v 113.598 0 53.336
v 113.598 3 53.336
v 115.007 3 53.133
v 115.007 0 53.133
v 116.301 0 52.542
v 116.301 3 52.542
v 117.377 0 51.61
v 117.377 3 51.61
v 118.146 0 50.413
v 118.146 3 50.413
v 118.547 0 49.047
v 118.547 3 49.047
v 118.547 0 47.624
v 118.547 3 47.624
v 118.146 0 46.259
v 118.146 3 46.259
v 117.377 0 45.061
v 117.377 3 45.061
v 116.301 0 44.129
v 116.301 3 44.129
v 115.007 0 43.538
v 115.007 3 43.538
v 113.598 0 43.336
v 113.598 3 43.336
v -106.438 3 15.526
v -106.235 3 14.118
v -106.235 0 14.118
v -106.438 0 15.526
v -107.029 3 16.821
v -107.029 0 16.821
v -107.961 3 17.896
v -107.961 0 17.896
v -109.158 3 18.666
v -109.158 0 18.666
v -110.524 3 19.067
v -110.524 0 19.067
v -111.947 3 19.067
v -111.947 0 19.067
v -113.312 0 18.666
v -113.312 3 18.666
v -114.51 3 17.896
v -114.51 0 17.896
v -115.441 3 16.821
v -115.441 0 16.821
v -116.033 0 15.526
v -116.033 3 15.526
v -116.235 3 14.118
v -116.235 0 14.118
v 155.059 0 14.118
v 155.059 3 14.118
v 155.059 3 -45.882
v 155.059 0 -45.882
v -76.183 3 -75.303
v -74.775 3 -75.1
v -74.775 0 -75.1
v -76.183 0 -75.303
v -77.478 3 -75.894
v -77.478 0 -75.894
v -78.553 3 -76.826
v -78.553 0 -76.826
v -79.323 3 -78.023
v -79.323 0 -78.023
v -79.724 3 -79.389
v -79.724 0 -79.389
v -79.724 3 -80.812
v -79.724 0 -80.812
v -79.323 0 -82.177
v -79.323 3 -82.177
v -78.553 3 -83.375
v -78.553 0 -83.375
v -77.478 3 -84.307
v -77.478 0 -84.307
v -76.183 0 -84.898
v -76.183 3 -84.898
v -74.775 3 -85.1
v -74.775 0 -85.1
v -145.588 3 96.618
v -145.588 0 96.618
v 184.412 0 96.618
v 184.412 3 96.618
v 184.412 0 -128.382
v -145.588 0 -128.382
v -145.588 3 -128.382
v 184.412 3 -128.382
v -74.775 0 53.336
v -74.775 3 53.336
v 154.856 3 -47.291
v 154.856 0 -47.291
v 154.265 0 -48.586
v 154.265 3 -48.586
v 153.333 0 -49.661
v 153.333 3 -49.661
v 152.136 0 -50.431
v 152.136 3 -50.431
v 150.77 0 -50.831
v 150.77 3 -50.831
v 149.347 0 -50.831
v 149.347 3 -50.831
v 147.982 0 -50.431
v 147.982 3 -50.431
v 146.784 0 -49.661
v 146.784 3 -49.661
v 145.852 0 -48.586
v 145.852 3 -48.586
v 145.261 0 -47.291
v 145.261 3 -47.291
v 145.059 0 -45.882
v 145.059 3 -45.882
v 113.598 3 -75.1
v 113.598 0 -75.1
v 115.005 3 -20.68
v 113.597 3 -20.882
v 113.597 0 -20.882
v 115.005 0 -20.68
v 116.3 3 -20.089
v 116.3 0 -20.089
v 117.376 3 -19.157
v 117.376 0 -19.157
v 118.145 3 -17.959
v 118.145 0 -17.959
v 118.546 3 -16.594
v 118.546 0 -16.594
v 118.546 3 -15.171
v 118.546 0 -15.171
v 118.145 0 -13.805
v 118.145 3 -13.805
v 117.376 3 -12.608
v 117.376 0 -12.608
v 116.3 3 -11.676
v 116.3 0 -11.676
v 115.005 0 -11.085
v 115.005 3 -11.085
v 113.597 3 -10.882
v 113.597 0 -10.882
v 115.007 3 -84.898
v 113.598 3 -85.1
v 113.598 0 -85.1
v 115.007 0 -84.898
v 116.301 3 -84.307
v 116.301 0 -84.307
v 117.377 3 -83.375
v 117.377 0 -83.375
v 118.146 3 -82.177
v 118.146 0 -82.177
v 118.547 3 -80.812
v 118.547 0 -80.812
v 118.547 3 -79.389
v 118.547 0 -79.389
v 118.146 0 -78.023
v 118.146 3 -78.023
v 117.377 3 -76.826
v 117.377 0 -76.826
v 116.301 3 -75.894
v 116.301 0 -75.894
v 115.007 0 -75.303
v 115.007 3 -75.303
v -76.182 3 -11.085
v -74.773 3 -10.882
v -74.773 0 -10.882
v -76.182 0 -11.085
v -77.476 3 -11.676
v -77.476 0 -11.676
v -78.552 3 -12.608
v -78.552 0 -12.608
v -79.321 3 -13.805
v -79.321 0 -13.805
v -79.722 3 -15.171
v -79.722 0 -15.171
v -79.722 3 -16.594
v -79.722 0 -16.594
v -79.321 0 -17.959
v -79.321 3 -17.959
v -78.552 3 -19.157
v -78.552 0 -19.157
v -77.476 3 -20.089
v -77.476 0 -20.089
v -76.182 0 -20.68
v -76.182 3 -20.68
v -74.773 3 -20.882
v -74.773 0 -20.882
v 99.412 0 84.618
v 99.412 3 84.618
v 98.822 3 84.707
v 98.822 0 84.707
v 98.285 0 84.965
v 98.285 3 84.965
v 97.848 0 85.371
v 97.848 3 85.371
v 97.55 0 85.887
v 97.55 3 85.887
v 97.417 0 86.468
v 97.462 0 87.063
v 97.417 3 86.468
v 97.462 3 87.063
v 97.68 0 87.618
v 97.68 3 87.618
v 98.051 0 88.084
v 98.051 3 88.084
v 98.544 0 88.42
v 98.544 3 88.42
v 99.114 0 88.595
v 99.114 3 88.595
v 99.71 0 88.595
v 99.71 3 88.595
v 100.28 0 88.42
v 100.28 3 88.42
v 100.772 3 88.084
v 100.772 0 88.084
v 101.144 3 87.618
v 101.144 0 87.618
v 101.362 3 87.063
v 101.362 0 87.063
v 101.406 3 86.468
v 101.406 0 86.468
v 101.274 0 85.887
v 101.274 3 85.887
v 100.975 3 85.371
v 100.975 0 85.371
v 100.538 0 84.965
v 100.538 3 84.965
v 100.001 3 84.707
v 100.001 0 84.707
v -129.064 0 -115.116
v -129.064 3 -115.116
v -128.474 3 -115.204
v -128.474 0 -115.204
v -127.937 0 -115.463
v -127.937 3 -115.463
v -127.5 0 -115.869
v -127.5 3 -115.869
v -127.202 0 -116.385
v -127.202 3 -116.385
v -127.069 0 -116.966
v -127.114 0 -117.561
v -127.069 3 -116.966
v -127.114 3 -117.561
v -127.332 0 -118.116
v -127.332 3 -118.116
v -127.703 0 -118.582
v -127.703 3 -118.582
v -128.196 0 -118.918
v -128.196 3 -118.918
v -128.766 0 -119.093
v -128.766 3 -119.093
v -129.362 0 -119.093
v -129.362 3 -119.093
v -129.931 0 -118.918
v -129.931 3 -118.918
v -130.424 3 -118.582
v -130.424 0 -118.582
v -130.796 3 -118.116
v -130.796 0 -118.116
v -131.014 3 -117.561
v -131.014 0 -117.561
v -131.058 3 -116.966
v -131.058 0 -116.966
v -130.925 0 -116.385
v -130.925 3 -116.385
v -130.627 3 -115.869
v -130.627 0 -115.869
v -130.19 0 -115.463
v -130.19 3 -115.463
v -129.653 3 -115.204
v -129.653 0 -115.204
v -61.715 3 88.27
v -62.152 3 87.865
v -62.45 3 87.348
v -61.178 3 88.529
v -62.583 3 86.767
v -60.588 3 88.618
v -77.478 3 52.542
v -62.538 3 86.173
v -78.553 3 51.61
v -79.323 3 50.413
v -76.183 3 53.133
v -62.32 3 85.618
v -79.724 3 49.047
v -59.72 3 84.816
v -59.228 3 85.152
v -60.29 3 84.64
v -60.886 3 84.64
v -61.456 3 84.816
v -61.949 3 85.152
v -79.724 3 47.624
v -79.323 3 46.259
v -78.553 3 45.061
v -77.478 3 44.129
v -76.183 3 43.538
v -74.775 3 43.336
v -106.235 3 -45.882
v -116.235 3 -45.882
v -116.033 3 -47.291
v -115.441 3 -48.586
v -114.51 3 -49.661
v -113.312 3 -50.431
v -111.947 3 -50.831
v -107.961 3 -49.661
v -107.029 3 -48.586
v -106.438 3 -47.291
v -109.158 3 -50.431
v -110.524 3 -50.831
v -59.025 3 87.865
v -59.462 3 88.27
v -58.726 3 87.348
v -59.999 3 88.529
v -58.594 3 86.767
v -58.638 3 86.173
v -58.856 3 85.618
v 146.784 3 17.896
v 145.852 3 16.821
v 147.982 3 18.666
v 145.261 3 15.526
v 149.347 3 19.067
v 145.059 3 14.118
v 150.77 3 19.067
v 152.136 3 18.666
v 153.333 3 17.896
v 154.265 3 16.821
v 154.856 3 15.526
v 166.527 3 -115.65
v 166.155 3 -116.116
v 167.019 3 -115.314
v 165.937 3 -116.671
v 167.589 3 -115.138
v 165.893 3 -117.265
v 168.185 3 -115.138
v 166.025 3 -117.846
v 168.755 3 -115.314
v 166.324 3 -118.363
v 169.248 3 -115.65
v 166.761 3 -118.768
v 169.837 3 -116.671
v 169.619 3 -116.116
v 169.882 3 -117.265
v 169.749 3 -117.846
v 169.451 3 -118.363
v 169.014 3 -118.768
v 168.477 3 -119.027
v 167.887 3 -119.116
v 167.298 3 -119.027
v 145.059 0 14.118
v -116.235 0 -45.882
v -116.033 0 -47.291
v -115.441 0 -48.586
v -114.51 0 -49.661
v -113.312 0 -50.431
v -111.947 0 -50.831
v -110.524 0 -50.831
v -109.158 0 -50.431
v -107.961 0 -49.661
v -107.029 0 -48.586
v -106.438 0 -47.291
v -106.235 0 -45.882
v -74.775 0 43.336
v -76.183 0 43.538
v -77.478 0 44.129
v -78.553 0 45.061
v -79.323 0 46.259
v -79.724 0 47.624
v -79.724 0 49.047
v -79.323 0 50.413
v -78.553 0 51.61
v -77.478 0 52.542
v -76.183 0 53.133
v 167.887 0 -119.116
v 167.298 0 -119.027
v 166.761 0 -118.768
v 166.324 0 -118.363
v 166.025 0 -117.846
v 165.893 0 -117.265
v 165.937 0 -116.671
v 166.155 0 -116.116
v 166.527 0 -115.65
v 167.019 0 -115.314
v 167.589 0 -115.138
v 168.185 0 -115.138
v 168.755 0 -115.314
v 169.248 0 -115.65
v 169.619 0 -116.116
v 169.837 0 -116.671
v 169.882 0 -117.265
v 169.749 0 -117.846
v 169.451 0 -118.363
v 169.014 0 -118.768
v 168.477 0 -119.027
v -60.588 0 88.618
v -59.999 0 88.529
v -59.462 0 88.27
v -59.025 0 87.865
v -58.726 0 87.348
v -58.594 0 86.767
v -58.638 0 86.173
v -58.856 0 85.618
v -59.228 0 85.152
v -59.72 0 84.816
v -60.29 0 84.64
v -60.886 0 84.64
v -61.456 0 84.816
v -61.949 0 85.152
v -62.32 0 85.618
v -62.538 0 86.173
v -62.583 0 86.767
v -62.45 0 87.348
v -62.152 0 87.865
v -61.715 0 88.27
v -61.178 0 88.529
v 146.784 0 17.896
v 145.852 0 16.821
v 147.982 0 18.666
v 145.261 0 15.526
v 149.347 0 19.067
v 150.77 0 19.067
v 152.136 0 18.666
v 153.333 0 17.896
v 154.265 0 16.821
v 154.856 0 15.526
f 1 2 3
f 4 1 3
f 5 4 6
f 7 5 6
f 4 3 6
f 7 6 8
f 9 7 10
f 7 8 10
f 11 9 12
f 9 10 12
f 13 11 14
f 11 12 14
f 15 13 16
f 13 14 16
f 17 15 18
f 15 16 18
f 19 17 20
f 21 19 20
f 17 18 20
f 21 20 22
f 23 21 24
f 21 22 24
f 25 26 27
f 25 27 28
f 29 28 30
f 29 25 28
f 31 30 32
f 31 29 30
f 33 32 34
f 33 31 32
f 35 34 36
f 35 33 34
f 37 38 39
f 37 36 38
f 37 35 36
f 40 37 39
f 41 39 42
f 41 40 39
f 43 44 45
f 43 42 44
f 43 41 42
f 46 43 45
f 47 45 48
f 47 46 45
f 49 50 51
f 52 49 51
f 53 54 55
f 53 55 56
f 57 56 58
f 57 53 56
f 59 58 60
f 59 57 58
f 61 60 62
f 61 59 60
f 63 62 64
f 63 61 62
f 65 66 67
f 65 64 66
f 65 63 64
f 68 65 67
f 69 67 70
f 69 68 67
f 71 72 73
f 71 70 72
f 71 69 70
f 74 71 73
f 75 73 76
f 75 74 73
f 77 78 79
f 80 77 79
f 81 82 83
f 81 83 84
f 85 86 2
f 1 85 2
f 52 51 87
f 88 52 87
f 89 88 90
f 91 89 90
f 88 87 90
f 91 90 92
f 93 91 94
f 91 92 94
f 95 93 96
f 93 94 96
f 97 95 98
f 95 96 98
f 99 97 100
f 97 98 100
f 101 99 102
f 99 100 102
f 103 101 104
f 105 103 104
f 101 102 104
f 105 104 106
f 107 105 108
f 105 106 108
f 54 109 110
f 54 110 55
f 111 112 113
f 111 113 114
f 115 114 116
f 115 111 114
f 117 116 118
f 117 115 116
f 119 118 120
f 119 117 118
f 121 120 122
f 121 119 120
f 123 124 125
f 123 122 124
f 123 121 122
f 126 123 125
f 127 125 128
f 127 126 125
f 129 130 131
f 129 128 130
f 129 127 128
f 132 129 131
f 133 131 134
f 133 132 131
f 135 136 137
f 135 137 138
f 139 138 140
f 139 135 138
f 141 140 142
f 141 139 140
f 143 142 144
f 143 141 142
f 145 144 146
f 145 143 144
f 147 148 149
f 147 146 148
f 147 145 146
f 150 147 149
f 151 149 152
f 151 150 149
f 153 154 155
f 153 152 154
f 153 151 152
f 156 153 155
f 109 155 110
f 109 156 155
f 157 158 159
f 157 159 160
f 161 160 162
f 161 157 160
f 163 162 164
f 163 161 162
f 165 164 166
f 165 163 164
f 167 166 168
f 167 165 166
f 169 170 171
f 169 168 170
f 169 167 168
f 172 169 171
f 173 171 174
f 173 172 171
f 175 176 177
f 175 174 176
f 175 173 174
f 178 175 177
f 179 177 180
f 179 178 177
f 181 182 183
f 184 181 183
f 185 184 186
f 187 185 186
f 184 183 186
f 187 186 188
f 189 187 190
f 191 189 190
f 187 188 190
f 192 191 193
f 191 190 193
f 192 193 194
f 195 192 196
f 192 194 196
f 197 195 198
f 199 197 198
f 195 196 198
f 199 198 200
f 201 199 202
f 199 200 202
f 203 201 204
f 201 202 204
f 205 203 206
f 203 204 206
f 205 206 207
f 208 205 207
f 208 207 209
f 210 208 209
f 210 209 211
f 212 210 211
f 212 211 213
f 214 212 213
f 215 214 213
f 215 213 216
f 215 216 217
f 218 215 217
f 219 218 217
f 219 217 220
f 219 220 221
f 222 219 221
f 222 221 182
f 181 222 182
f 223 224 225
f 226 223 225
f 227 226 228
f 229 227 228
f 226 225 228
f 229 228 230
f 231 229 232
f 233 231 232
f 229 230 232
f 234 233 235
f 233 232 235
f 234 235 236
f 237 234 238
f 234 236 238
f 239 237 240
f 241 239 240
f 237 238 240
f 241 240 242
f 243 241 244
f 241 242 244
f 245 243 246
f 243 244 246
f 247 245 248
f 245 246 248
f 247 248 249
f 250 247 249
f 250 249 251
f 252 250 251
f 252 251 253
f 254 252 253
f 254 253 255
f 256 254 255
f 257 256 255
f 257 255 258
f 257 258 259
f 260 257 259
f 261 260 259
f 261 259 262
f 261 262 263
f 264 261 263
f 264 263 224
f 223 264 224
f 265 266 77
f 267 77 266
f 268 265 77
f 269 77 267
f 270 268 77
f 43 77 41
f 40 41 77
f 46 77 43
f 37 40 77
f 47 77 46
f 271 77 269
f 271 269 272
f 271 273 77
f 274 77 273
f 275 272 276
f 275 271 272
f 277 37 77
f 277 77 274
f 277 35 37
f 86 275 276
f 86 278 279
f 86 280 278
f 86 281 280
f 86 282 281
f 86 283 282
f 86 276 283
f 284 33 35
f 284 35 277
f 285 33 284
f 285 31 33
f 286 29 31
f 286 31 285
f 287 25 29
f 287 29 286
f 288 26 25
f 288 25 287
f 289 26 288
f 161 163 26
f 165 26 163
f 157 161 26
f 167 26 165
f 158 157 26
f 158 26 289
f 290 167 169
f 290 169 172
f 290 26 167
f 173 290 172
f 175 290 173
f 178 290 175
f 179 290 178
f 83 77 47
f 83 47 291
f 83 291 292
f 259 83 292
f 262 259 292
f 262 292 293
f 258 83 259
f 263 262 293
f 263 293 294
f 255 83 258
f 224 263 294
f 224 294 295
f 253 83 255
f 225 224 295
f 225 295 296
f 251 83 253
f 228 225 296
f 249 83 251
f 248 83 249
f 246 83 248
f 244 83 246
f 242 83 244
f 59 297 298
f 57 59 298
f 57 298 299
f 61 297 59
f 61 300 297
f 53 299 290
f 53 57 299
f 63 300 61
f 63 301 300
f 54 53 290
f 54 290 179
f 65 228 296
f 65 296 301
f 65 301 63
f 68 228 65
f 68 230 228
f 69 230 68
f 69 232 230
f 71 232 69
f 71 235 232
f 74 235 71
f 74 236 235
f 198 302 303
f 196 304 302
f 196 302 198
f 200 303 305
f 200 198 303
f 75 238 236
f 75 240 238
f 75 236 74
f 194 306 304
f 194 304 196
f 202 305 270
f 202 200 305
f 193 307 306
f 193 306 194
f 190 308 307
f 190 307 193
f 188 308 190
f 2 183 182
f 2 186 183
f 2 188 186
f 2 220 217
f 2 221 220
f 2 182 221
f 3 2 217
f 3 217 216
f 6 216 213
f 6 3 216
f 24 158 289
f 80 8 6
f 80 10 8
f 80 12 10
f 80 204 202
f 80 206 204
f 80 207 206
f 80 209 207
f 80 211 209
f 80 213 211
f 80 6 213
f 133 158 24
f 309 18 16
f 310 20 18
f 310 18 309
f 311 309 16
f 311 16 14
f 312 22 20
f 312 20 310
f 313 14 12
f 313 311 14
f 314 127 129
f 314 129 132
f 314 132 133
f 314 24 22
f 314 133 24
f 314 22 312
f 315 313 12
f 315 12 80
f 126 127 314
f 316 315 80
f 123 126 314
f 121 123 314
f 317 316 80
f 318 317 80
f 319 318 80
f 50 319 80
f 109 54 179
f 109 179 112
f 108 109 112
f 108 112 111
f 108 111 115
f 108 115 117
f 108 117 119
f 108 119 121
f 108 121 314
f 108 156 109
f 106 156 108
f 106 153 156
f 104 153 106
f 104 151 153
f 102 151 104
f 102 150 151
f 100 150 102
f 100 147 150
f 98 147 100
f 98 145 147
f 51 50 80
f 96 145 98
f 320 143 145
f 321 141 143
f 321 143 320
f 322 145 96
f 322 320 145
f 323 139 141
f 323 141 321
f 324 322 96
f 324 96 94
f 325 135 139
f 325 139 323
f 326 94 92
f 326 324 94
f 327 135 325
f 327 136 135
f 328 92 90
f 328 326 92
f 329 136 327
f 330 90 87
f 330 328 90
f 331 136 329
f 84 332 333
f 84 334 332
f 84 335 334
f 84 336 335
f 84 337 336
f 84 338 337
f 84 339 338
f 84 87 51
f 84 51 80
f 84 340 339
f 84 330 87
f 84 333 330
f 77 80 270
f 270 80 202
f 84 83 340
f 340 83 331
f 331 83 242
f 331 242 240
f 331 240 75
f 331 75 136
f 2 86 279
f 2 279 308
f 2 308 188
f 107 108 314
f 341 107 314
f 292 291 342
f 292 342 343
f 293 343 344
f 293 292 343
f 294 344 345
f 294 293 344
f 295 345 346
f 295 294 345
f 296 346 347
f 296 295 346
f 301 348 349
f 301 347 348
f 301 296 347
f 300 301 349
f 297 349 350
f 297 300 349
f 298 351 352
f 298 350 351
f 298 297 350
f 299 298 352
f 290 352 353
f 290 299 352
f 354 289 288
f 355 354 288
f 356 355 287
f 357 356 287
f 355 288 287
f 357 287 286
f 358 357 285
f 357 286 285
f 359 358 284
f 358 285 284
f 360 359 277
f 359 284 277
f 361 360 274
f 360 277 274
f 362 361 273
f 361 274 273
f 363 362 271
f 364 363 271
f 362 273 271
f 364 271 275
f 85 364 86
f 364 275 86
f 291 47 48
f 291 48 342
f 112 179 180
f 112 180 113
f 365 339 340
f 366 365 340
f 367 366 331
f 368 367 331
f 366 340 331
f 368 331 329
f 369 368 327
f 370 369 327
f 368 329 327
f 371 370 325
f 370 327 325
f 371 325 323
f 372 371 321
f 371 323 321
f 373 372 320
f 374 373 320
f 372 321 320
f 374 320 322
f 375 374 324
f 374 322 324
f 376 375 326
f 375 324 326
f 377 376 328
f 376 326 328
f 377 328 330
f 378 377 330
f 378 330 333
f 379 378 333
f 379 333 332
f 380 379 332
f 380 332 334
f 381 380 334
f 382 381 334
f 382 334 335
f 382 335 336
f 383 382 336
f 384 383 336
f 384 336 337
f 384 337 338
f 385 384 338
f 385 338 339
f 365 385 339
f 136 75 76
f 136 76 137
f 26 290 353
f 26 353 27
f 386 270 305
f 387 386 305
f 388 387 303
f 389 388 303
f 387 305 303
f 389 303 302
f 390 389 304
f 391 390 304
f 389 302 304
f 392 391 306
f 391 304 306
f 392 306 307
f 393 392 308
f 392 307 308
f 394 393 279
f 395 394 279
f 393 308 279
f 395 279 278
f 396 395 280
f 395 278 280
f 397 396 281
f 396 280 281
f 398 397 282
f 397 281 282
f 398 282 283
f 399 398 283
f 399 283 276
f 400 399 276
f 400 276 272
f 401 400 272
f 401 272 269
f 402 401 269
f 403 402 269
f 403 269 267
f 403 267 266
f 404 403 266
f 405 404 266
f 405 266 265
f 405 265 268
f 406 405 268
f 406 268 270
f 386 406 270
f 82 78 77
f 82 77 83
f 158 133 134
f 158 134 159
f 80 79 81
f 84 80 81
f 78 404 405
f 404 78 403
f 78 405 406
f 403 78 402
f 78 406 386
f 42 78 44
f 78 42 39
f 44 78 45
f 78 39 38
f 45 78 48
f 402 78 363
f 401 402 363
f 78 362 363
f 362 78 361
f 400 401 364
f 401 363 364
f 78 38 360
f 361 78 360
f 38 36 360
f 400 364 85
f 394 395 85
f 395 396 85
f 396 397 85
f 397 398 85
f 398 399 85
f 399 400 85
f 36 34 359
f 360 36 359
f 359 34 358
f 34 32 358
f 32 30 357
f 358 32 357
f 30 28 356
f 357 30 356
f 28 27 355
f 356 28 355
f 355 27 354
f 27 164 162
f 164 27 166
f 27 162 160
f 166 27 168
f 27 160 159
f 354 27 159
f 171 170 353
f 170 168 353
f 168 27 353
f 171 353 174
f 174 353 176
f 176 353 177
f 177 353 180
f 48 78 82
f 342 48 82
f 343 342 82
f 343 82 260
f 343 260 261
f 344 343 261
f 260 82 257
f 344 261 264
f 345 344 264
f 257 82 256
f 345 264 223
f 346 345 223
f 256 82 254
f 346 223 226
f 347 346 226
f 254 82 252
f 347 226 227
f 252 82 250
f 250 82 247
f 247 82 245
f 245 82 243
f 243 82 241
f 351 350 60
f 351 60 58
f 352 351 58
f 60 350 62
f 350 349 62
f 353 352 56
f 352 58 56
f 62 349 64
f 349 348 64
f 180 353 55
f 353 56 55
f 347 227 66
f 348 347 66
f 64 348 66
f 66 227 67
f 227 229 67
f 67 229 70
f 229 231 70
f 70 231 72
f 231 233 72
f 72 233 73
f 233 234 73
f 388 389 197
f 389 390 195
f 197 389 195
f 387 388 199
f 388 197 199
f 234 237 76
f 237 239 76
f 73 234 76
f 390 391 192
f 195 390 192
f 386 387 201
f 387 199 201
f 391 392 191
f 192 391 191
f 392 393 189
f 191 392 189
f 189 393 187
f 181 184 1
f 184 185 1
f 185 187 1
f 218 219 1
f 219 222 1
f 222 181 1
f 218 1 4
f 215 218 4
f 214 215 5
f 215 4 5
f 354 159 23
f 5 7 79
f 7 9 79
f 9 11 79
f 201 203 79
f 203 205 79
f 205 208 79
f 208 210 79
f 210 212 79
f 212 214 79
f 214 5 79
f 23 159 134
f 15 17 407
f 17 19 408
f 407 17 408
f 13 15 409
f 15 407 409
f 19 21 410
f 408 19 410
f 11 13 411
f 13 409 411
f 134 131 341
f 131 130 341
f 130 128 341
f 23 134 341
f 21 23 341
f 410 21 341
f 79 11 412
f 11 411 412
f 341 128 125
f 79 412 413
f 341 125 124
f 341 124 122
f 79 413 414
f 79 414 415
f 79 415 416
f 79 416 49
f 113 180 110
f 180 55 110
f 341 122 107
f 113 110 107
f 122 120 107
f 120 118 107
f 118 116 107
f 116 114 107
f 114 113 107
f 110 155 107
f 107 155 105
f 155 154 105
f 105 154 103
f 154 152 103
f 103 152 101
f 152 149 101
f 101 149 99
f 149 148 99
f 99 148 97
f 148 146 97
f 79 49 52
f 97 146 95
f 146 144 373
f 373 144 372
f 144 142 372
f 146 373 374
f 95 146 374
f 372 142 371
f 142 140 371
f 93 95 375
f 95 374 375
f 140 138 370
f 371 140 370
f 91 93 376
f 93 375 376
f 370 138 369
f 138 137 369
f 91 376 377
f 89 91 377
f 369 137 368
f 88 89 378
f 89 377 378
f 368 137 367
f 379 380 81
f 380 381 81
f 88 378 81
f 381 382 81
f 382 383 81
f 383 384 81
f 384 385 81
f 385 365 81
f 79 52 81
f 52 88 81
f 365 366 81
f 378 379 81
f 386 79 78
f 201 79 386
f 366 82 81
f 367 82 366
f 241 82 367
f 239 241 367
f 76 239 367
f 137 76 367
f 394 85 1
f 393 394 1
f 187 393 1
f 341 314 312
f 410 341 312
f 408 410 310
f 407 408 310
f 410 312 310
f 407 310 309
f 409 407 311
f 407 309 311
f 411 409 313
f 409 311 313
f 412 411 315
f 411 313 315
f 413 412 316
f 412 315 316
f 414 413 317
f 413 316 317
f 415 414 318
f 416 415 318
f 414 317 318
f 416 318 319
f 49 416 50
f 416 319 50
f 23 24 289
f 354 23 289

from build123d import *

# Parameters (mm, degrees)
SKETCH_1_W          = 330
SKETCH_1_H          = 225
EXTRUDE_1_DEPTH     = 3
SKETCH_3_R          = 2
CUT_EXTRUDE_1_DEPTH = 225.719219269
CUT_EXTRUDE_2_DEPTH = 225.719219269
CUT_EXTRUDE_3_DEPTH = 225.719219269
CUT_EXTRUDE_4_DEPTH = 225.719219269


with BuildPart() as part:
    # 草图1 → 凸台-拉伸1 (new body)
    with BuildSketch(Plane(origin=(0, 0, 0), x_dir=(1, 0, 0), z_dir=(0, 1, 0))):
        with Locations((19.411764706, 15.882352941)):
            Rectangle(SKETCH_1_W, SKETCH_1_H)
    extrude(amount=EXTRUDE_1_DEPTH)

    # 草图3 → 切除-拉伸1 (cut, through all)
    with BuildSketch(Plane(origin=(0, 3, 0), x_dir=(1, 0, 0), z_dir=(0, 1, 0))):
        with Locations(Location((-129.063688438, 117.115616448, 0), (0, 0, 270))):
            Circle(SKETCH_3_R)
        with Locations(Location((167.88721785, 117.115616448, 0), (0, 0, 90))):
            Circle(SKETCH_3_R)
        with Locations(Location((-60.588235294, -86.617647059, 0), (0, 0, 270))):
            Circle(SKETCH_3_R)
        with Locations(Location((99.411764706, -86.617647059, 0), (0, 0, 90))):
            Circle(SKETCH_3_R)
    extrude(amount=-CUT_EXTRUDE_1_DEPTH, mode=Mode.SUBTRACT)

    # 草图4 → 切除-拉伸2 (cut, through all)
    with BuildSketch(Plane(origin=(0, 3, 0), x_dir=(1, 0, 0), z_dir=(0, 1, 0))):
        with BuildLine():
            Line((-116.235231271, -14.117647059), (-116.235231271, 45.882352941))
            ThreePointArc((-116.235231271, 45.882352941), (-111.235231271, 50.882352941), (-106.235231271, 45.882352941))
            Line((-106.235231271, 45.882352941), (-106.235231271, -14.117647059))
            ThreePointArc((-106.235231271, -14.117647059), (-111.235231271, -19.117647059), (-116.235231271, -14.117647059))
        make_face()
        with BuildLine():
            Line((155.058760683, -14.117647059), (155.058760683, 45.882352941))
            ThreePointArc((155.058760683, 45.882352941), (150.058760683, 50.882352941), (145.058760683, 45.882352941))
            Line((145.058760683, 45.882352941), (145.058760683, -14.117647059))
            ThreePointArc((145.058760683, -14.117647059), (150.058760683, -19.117647059), (155.058760683, -14.117647059))
        make_face()
    extrude(amount=-CUT_EXTRUDE_2_DEPTH, mode=Mode.SUBTRACT)

    # 草图5 → 切除-拉伸3 (cut, through all)
    with BuildSketch(Plane(origin=(0, 3, 0), x_dir=(1, 0, 0), z_dir=(0, 1, 0))):
        with BuildLine():
            Line((-74.774602087, 85.1003303), (113.598131499, 85.1003303))
            ThreePointArc((113.598131499, 85.1003303), (118.598131499, 80.1003303), (113.598131499, 75.1003303))
            Line((113.598131499, 75.1003303), (-74.774602087, 75.1003303))
            ThreePointArc((-74.774602087, 75.1003303), (-79.774602087, 80.1003303), (-74.774602087, 85.1003303))
        make_face()
        with BuildLine():
            Line((-74.774602087, -53.335624418), (113.598131499, -53.335624418))
            ThreePointArc((113.598131499, -53.335624418), (118.598131499, -48.335624418), (113.598131499, -43.335624418))
            Line((113.598131499, -43.335624418), (-74.774602087, -43.335624418))
            ThreePointArc((-74.774602087, -43.335624418), (-79.774602087, -48.335624418), (-74.774602087, -53.335624418))
        make_face()
    extrude(amount=-CUT_EXTRUDE_3_DEPTH, mode=Mode.SUBTRACT)

    # 草图6 → 切除-拉伸4 (cut, through all)
    with BuildSketch(Plane(origin=(0, 3, 0), x_dir=(1, 0, 0), z_dir=(0, 1, 0))):
        with BuildLine():
            Line((-74.773235294, 20.882352941), (113.596764706, 20.882352941))
            ThreePointArc((113.596764706, 20.882352941), (118.596764706, 15.882352941), (113.596764706, 10.882352941))
            Line((113.596764706, 10.882352941), (-74.773235294, 10.882352941))
            ThreePointArc((-74.773235294, 10.882352941), (-79.773235294, 15.882352941), (-74.773235294, 20.882352941))
        make_face()
    extrude(amount=-CUT_EXTRUDE_4_DEPTH, mode=Mode.SUBTRACT)


solid = part.part
